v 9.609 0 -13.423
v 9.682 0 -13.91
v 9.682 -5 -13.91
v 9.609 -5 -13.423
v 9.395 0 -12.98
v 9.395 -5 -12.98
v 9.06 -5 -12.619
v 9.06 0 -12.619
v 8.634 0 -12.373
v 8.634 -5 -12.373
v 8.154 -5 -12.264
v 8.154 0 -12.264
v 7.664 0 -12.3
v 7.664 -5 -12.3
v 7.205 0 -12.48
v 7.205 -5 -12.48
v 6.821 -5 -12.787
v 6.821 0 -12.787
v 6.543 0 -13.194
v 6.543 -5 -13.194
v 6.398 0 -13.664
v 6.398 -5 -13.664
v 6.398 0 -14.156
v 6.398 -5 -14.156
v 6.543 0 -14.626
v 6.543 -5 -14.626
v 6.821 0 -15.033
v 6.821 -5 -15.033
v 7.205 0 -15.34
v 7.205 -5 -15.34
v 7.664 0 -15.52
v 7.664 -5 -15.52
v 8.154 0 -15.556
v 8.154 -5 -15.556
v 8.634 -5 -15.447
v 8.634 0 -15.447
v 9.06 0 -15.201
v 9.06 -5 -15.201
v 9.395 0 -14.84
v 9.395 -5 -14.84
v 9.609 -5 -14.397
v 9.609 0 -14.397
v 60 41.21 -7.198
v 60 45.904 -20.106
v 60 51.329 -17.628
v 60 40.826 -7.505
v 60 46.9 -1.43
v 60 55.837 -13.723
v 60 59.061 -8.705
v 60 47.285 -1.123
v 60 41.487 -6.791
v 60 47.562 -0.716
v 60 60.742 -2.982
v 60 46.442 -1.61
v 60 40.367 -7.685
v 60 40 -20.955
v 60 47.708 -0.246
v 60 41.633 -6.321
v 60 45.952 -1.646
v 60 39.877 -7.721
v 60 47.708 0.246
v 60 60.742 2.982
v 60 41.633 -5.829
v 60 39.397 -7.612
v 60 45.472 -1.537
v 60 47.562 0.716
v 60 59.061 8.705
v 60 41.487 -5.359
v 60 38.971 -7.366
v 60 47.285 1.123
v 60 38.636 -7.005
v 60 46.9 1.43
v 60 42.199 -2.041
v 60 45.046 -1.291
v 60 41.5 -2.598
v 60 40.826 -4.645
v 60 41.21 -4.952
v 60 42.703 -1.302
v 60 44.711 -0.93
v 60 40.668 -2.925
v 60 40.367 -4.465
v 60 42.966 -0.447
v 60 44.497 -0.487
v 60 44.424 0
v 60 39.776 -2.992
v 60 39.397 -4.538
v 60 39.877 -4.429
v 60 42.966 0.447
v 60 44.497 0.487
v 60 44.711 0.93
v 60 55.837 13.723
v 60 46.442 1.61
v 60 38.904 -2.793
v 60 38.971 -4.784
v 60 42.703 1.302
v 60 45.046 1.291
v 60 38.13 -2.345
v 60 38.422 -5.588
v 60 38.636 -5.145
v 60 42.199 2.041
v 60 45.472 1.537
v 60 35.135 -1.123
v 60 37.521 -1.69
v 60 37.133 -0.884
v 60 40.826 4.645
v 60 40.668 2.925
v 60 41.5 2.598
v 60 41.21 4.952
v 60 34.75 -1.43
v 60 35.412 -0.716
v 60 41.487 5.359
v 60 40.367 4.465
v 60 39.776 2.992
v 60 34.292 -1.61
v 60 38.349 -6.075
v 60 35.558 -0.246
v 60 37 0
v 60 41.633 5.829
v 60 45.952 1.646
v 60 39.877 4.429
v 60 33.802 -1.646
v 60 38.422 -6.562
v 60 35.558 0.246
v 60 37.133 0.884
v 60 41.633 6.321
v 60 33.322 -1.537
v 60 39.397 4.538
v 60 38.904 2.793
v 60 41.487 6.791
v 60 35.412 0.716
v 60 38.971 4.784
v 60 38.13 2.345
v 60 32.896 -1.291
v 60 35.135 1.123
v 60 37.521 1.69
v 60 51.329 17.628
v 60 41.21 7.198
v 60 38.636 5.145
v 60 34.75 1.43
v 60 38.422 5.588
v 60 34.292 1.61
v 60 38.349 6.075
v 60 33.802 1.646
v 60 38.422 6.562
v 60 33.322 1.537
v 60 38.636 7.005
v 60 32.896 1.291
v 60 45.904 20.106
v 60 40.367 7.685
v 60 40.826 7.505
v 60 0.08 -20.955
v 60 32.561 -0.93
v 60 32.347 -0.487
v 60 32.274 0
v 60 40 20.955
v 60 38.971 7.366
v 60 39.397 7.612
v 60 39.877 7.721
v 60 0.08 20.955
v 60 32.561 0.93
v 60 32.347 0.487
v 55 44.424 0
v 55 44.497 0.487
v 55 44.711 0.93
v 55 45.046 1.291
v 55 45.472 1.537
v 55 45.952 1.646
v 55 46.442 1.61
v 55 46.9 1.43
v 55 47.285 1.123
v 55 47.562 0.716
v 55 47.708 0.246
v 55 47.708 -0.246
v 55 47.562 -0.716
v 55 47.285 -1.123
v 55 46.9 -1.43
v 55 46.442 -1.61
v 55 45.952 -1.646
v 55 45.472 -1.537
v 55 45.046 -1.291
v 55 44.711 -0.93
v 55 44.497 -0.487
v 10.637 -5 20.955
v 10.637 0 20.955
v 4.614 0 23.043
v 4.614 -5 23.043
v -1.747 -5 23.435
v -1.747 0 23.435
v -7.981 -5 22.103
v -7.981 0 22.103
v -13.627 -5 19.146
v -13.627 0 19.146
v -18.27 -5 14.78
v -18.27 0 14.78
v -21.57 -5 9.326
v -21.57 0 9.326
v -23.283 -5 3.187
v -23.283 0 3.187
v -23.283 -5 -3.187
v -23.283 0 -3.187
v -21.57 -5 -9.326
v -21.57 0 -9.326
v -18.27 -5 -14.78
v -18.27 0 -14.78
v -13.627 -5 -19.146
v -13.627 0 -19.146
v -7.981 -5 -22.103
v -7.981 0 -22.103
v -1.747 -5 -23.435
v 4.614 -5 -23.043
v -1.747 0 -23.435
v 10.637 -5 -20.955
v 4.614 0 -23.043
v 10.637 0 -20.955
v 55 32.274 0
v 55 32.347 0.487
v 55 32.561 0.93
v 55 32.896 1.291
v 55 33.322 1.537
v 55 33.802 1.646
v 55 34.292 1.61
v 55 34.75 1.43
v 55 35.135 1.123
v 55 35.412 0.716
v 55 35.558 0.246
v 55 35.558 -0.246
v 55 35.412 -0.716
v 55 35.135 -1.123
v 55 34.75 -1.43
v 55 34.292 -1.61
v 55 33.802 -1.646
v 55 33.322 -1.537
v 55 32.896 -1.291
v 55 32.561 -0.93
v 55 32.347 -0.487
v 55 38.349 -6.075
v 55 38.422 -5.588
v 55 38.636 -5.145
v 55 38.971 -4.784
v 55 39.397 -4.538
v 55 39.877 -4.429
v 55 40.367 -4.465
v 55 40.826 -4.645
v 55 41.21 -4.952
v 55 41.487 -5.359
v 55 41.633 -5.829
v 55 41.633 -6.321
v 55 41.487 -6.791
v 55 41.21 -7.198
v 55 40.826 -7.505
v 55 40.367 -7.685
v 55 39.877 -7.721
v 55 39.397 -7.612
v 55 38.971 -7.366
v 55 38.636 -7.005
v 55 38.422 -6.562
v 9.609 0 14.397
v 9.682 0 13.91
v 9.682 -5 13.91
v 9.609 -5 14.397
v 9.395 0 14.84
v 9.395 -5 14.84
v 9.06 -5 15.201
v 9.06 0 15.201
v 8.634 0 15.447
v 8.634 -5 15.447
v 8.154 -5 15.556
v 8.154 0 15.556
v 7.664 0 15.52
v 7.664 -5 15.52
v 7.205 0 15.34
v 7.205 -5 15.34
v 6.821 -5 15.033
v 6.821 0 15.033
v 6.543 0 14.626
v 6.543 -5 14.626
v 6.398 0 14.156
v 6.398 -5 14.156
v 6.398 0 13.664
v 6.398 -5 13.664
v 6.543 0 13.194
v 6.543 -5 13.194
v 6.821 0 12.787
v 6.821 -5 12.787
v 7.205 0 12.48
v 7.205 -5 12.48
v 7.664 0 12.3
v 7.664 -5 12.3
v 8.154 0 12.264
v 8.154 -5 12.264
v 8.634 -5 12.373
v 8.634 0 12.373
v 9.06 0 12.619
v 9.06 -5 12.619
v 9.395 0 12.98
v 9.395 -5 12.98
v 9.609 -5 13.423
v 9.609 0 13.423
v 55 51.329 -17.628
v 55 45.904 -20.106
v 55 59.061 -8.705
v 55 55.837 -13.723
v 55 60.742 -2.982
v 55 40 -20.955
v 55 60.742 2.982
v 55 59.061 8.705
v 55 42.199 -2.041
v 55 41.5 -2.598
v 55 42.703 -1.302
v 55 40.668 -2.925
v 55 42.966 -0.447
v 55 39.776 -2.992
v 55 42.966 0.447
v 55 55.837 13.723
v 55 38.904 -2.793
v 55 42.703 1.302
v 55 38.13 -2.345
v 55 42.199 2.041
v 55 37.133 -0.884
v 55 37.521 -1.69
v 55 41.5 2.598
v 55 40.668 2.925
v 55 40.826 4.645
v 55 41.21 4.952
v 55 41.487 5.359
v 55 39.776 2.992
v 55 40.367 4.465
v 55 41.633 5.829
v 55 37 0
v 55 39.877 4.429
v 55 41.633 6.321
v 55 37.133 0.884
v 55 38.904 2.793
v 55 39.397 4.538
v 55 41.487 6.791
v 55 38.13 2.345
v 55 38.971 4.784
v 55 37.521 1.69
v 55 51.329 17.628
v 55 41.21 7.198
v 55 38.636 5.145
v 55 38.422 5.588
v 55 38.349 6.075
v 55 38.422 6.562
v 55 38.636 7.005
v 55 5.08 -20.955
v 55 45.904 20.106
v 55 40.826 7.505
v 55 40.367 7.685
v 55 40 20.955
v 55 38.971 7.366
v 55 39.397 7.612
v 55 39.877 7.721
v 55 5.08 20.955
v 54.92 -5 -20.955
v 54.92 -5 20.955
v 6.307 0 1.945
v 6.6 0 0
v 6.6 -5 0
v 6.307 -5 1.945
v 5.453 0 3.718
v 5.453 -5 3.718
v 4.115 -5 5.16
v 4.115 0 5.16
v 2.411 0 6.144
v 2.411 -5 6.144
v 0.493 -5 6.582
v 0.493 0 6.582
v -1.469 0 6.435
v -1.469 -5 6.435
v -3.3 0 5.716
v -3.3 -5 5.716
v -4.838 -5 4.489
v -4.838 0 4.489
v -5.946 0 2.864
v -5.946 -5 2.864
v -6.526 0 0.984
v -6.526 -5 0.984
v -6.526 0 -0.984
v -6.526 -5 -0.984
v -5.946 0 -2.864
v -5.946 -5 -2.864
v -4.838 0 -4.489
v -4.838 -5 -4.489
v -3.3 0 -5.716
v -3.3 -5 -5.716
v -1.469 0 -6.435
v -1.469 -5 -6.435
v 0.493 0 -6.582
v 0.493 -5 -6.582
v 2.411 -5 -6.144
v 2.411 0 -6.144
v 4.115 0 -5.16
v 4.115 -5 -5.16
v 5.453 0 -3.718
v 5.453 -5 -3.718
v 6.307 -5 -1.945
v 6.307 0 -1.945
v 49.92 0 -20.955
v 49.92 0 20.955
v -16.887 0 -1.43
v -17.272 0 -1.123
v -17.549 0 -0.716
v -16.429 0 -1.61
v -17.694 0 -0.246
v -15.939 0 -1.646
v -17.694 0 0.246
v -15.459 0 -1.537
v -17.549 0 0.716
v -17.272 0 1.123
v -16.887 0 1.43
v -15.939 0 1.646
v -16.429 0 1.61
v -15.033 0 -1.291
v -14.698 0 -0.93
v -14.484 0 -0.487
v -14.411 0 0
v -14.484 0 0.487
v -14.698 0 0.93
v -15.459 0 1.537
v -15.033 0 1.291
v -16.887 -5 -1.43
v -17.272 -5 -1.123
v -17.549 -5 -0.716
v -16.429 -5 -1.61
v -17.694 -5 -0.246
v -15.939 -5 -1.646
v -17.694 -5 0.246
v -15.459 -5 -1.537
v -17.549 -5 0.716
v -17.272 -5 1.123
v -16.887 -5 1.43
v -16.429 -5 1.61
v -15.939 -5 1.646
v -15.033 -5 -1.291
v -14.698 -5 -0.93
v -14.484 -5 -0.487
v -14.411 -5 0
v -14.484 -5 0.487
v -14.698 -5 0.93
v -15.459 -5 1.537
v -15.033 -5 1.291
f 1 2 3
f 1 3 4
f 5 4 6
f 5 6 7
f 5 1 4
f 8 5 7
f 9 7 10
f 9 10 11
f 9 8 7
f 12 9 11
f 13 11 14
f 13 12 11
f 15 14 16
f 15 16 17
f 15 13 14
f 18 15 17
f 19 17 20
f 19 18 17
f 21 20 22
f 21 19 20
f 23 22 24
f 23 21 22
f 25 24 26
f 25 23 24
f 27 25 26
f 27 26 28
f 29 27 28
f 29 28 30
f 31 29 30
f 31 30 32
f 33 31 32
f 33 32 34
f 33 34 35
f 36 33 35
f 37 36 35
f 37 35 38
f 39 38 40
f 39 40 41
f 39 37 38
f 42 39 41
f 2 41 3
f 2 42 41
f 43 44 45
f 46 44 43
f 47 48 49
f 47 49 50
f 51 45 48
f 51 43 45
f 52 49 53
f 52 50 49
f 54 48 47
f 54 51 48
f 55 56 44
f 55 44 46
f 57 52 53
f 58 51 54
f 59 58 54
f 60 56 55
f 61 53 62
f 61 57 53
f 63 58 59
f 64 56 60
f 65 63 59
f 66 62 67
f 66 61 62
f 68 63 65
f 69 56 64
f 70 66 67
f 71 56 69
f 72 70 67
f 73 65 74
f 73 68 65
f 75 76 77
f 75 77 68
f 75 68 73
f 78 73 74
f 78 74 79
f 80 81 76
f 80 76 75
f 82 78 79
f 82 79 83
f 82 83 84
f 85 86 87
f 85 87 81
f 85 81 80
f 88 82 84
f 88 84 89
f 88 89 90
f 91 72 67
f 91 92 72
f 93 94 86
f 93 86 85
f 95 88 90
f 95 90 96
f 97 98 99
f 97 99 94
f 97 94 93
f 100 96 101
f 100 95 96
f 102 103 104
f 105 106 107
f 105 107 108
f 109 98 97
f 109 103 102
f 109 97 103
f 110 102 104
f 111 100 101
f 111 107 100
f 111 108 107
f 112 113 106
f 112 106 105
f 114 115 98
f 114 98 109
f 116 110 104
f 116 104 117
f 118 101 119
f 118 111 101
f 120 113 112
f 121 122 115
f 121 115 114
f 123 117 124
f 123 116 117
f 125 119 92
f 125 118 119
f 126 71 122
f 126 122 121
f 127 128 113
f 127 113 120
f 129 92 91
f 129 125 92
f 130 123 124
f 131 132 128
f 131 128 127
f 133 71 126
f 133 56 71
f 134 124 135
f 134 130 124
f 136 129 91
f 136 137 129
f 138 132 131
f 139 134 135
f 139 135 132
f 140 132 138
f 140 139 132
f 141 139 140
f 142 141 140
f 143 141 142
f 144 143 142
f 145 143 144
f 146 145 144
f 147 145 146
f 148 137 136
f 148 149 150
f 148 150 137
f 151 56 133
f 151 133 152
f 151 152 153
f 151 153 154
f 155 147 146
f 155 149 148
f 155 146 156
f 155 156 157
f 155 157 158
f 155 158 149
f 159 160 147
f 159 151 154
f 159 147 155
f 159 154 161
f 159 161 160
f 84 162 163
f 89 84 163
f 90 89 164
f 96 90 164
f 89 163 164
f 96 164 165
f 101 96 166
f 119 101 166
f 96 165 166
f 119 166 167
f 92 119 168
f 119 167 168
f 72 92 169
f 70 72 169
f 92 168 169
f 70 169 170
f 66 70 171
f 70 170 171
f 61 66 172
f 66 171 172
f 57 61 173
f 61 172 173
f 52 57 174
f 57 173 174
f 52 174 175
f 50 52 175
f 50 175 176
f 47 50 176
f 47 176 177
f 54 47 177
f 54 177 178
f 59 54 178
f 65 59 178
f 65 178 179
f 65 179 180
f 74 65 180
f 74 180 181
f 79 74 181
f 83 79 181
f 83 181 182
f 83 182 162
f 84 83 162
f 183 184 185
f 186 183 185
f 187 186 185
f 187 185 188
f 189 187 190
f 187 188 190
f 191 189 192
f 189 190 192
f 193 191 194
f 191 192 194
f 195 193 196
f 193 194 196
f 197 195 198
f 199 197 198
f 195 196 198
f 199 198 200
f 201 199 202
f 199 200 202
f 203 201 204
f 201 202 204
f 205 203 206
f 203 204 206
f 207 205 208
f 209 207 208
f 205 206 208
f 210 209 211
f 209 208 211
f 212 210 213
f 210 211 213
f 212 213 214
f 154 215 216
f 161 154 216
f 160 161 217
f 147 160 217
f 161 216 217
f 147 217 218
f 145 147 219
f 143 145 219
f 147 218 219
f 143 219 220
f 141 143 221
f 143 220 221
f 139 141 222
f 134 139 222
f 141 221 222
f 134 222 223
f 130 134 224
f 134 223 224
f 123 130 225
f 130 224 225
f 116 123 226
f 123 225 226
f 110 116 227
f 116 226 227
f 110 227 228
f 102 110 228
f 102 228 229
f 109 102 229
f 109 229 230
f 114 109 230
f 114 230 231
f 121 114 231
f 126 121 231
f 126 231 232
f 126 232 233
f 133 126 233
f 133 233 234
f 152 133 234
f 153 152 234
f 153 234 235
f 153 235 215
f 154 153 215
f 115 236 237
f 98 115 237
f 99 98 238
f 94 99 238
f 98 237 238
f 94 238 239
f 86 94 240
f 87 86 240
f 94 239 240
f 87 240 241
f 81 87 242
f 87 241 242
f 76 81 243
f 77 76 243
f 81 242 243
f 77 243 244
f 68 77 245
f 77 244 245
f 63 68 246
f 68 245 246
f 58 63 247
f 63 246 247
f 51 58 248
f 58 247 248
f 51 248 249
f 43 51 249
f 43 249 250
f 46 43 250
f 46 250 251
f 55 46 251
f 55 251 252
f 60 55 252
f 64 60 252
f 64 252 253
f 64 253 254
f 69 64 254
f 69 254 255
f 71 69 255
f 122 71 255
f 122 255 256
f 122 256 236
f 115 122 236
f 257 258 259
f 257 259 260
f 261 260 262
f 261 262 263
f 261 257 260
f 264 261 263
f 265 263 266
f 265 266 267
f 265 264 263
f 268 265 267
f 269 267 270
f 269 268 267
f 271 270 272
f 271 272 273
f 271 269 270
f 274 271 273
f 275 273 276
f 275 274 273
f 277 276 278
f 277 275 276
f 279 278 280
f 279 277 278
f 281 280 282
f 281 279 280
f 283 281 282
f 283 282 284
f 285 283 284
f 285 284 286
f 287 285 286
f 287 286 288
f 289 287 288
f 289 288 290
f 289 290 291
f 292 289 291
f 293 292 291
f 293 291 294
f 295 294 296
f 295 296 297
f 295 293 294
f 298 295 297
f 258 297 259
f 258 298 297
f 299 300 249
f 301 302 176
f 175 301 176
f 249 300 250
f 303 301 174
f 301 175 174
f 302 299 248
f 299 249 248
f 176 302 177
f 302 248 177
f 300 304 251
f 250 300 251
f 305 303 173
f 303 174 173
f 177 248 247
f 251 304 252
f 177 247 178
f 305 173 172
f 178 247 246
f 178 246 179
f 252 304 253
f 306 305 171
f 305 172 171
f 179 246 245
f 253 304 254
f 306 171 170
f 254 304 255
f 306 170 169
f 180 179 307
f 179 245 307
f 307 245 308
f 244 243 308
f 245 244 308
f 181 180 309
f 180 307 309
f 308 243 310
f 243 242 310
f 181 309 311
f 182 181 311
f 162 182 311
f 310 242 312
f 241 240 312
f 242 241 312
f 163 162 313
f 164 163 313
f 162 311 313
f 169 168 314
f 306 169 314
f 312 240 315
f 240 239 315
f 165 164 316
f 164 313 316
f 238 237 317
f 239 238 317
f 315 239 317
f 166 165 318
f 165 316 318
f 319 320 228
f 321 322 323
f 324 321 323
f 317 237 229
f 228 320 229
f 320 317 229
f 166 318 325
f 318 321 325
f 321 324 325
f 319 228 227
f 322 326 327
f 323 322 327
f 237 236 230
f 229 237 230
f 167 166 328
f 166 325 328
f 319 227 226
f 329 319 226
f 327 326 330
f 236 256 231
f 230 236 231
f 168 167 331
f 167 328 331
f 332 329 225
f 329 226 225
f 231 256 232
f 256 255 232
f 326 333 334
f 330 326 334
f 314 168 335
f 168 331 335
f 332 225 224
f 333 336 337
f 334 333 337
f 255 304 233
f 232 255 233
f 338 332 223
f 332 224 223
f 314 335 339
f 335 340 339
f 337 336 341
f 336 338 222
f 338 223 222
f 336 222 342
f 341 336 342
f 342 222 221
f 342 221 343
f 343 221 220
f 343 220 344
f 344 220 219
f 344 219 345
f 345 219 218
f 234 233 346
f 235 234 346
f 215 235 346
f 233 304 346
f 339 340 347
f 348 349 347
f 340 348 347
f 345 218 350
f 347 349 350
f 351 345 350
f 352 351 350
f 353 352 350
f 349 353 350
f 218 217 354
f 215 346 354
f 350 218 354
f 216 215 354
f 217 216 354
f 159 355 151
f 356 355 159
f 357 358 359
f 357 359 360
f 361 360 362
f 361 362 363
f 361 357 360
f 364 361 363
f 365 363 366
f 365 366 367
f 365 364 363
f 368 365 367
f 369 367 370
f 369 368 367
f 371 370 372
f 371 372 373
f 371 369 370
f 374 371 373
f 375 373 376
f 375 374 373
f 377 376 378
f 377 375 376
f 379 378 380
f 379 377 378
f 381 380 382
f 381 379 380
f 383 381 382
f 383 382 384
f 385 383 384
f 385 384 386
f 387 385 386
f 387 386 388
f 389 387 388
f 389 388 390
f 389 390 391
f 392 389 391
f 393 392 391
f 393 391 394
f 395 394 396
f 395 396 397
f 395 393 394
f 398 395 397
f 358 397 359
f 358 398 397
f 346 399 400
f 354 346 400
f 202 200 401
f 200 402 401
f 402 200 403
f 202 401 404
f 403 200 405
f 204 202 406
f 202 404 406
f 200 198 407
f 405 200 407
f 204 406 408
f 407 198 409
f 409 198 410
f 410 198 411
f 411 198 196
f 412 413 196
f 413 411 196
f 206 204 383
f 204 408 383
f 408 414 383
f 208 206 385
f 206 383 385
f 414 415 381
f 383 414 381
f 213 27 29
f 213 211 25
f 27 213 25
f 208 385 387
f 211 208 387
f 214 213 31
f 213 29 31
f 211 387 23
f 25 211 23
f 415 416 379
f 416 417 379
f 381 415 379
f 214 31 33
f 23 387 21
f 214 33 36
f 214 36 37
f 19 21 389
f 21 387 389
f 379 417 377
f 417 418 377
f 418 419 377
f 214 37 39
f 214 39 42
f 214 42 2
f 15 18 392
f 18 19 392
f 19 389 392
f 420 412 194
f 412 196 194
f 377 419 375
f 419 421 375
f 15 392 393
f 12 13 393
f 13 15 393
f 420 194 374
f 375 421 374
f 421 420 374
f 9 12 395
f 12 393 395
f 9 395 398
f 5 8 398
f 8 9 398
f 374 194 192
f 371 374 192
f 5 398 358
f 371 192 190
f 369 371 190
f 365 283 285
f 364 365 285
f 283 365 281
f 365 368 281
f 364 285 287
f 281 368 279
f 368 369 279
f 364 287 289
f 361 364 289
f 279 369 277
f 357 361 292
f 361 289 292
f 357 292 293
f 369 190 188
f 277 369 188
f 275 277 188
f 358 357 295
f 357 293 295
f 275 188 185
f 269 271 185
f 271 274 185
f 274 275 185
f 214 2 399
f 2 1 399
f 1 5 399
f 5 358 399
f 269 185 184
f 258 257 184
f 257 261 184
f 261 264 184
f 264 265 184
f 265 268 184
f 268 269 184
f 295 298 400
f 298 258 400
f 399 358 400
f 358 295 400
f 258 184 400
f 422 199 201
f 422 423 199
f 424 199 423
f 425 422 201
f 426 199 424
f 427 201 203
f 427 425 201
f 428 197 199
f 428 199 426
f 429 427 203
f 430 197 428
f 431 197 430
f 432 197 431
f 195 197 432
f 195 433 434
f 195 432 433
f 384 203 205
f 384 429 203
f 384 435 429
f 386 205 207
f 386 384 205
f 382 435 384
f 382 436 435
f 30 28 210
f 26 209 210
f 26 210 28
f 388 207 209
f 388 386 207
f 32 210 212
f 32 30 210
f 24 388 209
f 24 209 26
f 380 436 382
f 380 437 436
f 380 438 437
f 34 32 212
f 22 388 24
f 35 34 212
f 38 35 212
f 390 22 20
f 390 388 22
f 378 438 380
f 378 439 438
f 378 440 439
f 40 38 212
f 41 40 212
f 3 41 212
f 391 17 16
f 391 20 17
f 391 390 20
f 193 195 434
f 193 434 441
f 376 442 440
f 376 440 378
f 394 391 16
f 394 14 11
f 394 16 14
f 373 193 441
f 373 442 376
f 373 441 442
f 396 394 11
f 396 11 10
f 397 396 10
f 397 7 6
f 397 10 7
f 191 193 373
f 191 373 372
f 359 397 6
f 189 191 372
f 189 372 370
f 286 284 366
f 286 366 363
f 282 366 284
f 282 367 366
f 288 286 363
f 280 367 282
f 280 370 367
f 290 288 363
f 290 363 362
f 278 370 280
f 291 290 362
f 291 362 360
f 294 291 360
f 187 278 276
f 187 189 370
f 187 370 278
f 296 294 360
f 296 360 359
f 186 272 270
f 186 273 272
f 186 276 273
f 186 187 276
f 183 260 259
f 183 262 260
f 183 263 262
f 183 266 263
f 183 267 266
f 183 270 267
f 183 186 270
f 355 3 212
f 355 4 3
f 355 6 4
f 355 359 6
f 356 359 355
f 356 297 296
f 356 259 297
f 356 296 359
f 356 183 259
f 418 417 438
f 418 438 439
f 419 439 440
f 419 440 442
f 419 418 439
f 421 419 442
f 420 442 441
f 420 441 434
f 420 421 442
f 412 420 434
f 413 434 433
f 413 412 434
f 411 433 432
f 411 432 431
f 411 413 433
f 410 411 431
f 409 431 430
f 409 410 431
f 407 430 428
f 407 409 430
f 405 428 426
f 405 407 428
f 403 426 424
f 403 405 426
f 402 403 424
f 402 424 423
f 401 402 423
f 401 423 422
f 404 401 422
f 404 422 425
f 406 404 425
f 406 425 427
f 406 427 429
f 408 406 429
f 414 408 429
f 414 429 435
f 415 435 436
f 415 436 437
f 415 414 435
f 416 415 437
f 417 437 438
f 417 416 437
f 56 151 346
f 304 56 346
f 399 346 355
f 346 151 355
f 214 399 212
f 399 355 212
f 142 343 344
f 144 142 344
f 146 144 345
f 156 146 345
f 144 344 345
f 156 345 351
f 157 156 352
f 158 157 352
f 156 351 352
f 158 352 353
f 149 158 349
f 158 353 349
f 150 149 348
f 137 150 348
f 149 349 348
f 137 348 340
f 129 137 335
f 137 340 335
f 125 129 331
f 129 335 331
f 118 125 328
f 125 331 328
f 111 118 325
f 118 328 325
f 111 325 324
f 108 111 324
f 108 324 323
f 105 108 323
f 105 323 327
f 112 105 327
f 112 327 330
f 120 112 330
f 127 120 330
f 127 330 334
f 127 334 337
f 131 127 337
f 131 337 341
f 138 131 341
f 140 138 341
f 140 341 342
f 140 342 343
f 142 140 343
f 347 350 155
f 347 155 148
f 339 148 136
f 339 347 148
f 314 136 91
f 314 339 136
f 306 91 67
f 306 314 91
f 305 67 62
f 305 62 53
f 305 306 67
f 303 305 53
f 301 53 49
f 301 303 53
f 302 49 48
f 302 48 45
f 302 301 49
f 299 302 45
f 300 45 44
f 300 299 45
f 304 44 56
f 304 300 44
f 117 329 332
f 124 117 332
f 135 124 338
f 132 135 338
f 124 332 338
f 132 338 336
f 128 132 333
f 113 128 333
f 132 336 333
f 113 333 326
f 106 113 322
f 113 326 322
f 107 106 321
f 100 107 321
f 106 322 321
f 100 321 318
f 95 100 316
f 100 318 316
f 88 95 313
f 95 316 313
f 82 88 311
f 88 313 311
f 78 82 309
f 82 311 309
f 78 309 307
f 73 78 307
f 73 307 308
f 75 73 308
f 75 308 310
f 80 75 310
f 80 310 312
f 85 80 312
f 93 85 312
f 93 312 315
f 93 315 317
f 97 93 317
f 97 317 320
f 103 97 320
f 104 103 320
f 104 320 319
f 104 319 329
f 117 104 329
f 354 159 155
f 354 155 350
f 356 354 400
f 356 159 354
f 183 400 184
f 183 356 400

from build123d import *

# Parameters (mm, degrees)
F0_R     = 23.5
F0_R_2   = 1.651
F0_R_3   = 6.6
F1_DEPTH = 5
F2_W     = 49.363366
F2_H     = 41.91
F3_DEPTH = 5
F4_W     = 5
F4_H     = 41.91
F5_DEPTH = 40
F6_R     = 20.955
F7_DEPTH = 5
F8_R     = 1.651
F8_R_2   = 3
F9_DEPTH = 25.4
F10_SIZE = 5.08


with BuildPart() as f1:
    # F0 (on Front) → F1 (new body)
    with BuildSketch(Plane.XZ):
        Circle(F0_R)
        with Locations((8.030942, -13.91)):
            Circle(F0_R_2, mode=Mode.SUBTRACT)
        with Locations((-16.061884, 0)):
            Circle(F0_R_2, mode=Mode.SUBTRACT)
        Circle(F0_R_3, mode=Mode.SUBTRACT)
        with Locations((8.030942, 13.91)):
            Circle(F0_R_2, mode=Mode.SUBTRACT)
    extrude(amount=F1_DEPTH)

    # F2 (on Front) → F3 (join)
    with BuildSketch(Plane.XZ):
        with Locations((35.318317, 0)):
            Rectangle(F2_W, F2_H)
    extrude(amount=F3_DEPTH)

    # F4 (on face) → F5 (join)
    with BuildSketch(Plane(origin=(0, 0, 0), x_dir=(-1, 0, 0), z_dir=(0, 1, 0))):
        with Locations((-57.5, 0)):
            Rectangle(F4_W, F4_H)
    extrude(amount=F5_DEPTH)

    # F6 (on face) → F7 (join)
    with BuildSketch(Plane(origin=(55, 0, 0), x_dir=(0, -1, 0), z_dir=(-1, 0, 0))):
        with Locations((-40, 0)):
            Circle(F6_R)
    extrude(amount=-F7_DEPTH)

    # F8 (on face) → F9 (cut)
    with BuildSketch(Plane(origin=(55, 0, 0), x_dir=(0, -1, 0), z_dir=(-1, 0, 0))):
        with Locations((-40, 6.075)):
            Circle(F8_R)
        with Locations((-46.075, 0)):
            Circle(F8_R)
        with Locations((-40, -6.075)):
            Circle(F8_R)
        with Locations((-33.925, 0)):
            Circle(F8_R)
        with Locations((-40, 0)):
            Circle(F8_R_2)
    extrude(amount=-F9_DEPTH, mode=Mode.SUBTRACT)

    # F10
    f10_edges = [f1.edges().sort_by_distance(p)[0] for p in [
        (55, 0, 0),
        (60, -5, 0),
    ]]
    chamfer(f10_edges, length=F10_SIZE)


solid = f1.part
